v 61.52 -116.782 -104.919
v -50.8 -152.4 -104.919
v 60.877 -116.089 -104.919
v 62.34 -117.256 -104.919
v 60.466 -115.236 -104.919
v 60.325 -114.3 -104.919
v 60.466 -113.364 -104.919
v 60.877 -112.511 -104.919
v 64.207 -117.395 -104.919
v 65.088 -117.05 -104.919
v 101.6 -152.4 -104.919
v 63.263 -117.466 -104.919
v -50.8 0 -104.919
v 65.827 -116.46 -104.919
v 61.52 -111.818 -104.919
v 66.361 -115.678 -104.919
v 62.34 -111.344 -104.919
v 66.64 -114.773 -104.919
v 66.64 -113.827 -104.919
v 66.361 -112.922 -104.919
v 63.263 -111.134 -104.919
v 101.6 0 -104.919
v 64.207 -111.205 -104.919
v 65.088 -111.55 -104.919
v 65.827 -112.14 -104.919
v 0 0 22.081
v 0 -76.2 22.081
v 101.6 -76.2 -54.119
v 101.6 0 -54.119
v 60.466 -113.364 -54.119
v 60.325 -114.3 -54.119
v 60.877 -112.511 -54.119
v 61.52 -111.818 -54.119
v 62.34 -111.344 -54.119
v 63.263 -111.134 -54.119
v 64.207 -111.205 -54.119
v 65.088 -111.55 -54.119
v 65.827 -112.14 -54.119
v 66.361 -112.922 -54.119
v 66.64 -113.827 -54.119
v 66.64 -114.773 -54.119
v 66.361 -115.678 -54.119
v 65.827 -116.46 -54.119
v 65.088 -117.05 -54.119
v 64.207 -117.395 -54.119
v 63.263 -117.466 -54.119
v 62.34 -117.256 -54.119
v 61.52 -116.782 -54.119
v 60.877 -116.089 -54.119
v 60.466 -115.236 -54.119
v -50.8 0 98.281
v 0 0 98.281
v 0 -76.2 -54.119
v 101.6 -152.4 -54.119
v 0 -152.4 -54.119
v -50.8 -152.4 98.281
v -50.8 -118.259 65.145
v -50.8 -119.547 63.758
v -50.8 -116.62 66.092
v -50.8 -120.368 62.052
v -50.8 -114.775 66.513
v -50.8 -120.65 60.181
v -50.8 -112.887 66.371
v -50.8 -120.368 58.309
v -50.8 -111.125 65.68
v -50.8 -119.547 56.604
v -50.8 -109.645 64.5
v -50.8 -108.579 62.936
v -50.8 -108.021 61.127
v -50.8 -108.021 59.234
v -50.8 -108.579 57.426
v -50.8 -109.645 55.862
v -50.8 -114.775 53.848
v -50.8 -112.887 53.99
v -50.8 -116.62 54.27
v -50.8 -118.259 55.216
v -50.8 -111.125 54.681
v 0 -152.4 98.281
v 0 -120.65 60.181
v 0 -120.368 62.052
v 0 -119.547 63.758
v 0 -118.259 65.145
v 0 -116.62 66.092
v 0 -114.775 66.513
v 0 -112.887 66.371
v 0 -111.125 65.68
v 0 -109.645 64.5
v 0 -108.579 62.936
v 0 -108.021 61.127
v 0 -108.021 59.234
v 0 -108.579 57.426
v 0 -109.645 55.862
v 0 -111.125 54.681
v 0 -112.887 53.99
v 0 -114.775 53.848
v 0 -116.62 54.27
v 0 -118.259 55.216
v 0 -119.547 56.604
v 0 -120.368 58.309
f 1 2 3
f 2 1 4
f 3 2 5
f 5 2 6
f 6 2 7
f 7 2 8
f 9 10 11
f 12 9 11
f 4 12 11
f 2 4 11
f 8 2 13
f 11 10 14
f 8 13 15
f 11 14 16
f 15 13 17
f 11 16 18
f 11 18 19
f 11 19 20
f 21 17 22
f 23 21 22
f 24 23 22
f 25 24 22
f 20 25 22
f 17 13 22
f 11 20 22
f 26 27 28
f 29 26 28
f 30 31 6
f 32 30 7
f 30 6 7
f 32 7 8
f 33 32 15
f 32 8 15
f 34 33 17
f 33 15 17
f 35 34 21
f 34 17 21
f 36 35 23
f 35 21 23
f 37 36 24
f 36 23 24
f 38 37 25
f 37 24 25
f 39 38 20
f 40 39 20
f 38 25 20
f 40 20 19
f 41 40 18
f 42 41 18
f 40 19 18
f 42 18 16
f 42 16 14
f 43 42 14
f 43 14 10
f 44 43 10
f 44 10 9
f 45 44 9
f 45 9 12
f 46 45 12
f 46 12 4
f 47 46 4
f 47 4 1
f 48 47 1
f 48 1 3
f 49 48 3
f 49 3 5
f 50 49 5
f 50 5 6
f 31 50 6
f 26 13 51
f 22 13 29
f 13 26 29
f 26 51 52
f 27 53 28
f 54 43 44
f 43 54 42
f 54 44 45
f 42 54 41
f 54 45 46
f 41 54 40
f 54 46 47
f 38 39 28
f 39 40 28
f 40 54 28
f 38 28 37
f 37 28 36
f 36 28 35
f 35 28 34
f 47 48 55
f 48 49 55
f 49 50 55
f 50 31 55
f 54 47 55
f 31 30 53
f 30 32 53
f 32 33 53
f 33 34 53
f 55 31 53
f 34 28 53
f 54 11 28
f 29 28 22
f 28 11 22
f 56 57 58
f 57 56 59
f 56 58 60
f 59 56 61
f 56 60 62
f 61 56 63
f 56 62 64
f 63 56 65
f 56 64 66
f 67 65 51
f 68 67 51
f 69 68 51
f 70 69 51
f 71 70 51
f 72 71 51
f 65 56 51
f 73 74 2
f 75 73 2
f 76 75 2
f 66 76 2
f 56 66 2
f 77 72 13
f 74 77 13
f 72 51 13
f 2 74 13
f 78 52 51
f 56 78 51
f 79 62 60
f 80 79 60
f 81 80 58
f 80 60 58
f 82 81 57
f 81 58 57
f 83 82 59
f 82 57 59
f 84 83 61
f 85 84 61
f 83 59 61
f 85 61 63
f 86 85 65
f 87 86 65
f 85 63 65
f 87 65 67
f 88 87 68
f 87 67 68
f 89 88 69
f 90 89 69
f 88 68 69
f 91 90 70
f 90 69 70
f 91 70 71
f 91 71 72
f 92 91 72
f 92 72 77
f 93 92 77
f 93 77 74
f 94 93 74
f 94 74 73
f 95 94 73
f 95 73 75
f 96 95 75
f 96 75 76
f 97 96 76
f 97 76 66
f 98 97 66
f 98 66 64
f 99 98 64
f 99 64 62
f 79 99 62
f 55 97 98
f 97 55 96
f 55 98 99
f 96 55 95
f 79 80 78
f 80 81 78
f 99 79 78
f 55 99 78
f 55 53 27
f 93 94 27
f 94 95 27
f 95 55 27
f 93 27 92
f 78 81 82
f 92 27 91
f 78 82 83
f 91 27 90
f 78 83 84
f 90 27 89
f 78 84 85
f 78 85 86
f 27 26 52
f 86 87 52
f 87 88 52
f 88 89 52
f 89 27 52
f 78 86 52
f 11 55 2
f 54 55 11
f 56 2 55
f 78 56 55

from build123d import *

# Parameters (mm, degrees)
F1_DEPTH = 152.4
F2_W     = 101.6
F2_H     = 76.2
F3_DEPTH = 76.2
F5_DEPTH = 76.2
F8_D     = 12.7
F9_D     = 6.35


with BuildPart() as f1:
    # F0 (on Front) → F1 (new body)
    with BuildSketch(Plane.XZ):
        Polygon((0, 98.280699), (-50.8, 98.280699), (-50.8, -104.919301), (101.6, -104.919301), (101.6, -54.119301), (0, -54.119301), align=None)
    extrude(amount=F1_DEPTH)

    # F2 (on face) → F3 (join)
    with BuildSketch(Plane.XY.offset(-54.119301)):
        with Locations((50.8, -38.1)):
            Rectangle(F2_W, F2_H)
    extrude(amount=F3_DEPTH)

    # F4 (on face) → F5 (cut)
    with BuildSketch(Plane.XZ.offset(76.2)):
        Polygon((101.6, 22.080699), (0, 22.080699), (101.6, -54.119301), align=None)
    extrude(amount=-F5_DEPTH, mode=Mode.SUBTRACT)

    # F8 (through all)
    with Locations(Plane.YZ):
        with Locations((-114.3, 60.180699)):
            Hole(F8_D / 2)

    # F9 (through all)
    with Locations(Plane.XY.offset(-54.119301)):
        with Locations((63.5, -114.3)):
            Hole(F9_D / 2)


solid = f1.part
